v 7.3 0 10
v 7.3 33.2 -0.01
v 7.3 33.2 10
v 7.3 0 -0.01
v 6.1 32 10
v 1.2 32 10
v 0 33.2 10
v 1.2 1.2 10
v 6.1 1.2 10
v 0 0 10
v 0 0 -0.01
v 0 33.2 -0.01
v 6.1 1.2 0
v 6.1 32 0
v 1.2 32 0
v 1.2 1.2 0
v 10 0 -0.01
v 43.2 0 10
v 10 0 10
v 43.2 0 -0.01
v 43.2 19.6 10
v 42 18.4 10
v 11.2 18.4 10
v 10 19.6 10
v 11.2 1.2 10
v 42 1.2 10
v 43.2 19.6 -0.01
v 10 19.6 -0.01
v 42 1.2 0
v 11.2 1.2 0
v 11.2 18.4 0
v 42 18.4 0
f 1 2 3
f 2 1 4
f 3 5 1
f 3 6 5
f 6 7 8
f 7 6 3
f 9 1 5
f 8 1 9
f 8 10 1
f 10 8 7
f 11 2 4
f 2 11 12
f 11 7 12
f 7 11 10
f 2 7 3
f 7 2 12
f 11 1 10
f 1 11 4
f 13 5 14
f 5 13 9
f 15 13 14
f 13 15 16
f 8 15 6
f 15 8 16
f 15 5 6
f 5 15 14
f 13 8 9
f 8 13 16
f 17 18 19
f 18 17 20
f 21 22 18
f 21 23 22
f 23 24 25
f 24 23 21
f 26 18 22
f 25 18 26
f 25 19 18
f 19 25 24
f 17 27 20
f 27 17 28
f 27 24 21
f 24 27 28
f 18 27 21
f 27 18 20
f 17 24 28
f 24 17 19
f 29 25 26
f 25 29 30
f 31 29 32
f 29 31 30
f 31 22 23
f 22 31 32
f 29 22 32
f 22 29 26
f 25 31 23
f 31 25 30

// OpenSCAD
// file: ../../Base/Boxes.scad
// Fischertechnik Box Foundation
// Pre-designed Boxes

use <Constants.scad>

include <PlacementOptions.scad>

box190Width = 190;
box190Depth = 130;
box130Width = 130;
box130Depth = 95;
boxUsageHeight = 33.9;
boxWallThickness = 2.4;
boxBaseThickness = 1.0;

// getBoxWallThickness()
// Gets the wall thickness of a Fischertechnik Box

function getBoxWallThickness() = boxWallThickness;

// Gets the usable height of a fischertechnik box
function getBoxUsageHeight() = boxUsageHeight;

// Gets the thickness of the Fischertechnik box base.
function getBoxBaseThickness() = boxBaseThickness;

// Gets the usable inner space of a Box 190 as an x/y-list
function getBox190Space() = [
    box190Width - 2*getBoxWallThickness(), 
    box190Depth - 2*getBoxWallThickness() ];

// Imports the Fischertechnik empty box 130x190 mm and places it at position 0,0
// 190x130 are the outer sizes, the inner space is slightly smaller. Use getBox190Space() to get the inner sizes.
// This module needs the STL file "Fischertechnik Box 130x190.stl" in the library path.
// The box is positioned that the usable inner space is at the 0,0,0 position. The

module Box190() {
    translate([-getBoxWallThickness(),-getBoxWallThickness(),-getBoxBaseThickness()])
        import("Fischertechnik Box 130x190.stl", convexity=3);
}

// Gets the usable inner space of a Box 130 as an x/y-list
function getBox130Space() = [
    box130Width - 2*getBoxWallThickness(), 
    box130Depth - 2*getBoxWallThickness() ];

// Imports the Fischertechnik empty box 95x130 mm and places it at position 0,0
// 190x130 are the outer sizes, the inner space is slightly smaller. Use getBox190Space() to get the inner sizes.
// This module needs the STL file "Fischertechnik Box 95x130.stl" in the library path.
// The box is positioned that the usable inner space is at the 0,0,0 position. The

module Box130() {
    translate([-getBoxWallThickness(),-getBoxWallThickness(),-getBoxBaseThickness()])
        import("Fischertechnik Box 95x130.stl", convexity=3);
}

// Creates a web at the specified box walls
// corner 0 = LowerLeft, 1 = UpperLeft, 2 = UpperRight, 3 = LowerRight
// side 0 = LeftOfCorner, 1 = RightOfCorner
// distance = Distance in mm from the corner
// box = inner width and depth of the box (default: Box 190)
// webWidth = length of the web (default is 3 mms)
// webThickness = thickness of the web (default is 1 mm)

module BoxWeb(corner, side, distance, box=getBox190Space(), webWidth=3, webThickness=1.0) {
    sink = getBoxWallThickness()/2;

    width = (corner % 2 == 0) ? 
            (side == LeftOfCorner ? webWidth : webThickness) :
            (side == LeftOfCorner ? webThickness : webWidth);

    depth = (corner % 2 == 0) ? 
            (side == RightOfCorner ? webWidth : webThickness) :
            (side == RightOfCorner ? webThickness : webWidth);
    
    xDiff = corner == LowerLeft ? 
                (side == LeftOfCorner ? -sink : distance) :
            (corner == UpperLeft ?                
                (side == LeftOfCorner ? distance : -sink) :
            (corner == UpperRight ?
                (side == LeftOfCorner ? box.x-webWidth+sink : box.x-distance-webThickness) :
                (side == LeftOfCorner ? box.x-distance-webThickness: box.x-webWidth+sink)));

    yDiff = corner == LowerLeft ? 
                (side == RightOfCorner ? -sink : distance) :
            (corner == UpperLeft ?
                (side == RightOfCorner ? box.y-distance : box.y-webWidth+sink) :
            (corner == UpperRight ?
                (side == RightOfCorner ? box.y-webWidth+sink : box.y-distance) :
                (side == RightOfCorner ? distance : -sink)));
    
    translate([xDiff, yDiff, -getExcess()])
        cube([width, depth, boxUsageHeight + 2*getExcess()]);
}
// file: ../../Base/Rotation.scad
// Fischertechnik Box Foundation
// Geometry Helpers Rotation

include <PlacementOptions.scad>

// getRotatedSpace(space, rotation=NoRotation)
// Rotates the space dependent on the specified rotation

function getRotatedSpace(space, rotation=NoRotation) = [
    (rotation == Rotate90 || rotation == Rotate270) ? space.y : space.x,
    (rotation == Rotate90 || rotation == Rotate270) ? space.x : space.y
];

// Rotates the given space around the fixed left lower corner
// space = the space the children needs as width/depth list [width,depth]
// rotation = 0 Rotate0 degrees, 1 Rotate90 degrees, 2 Rotate180 degrees, 3 Rotate270 degrees (equivalent to -90)

module RotateFix(space, rotation=Rotate0) {
    dy = (rotation == Rotate0 || rotation == Rotate270) ? 0 :
        (rotation == Rotate90) ? space.x :
        space.y;
    dx = (rotation < Rotate180) ? 0 :
        (rotation == Rotate180) ? space.x :
        space.y;
    
    translate([dx, dy, 0])
        rotate([0, 0, rotations[rotation]])
            children();
}
// file: ../../Base/Alignment.scad
// Fischertechnik Box Foundation
// Geometry Helpers Alignment

include <PlacementOptions.scad>

// getAlignedX(elementWidth, spaceWidth, align=AlignRight, offset=0)
// Gets the aligned X offset of an element with the given
// width in the given space.
// elementWidth = The width of the element to positon
// spaceWidth = The space where the element should be aligned
// align = 0 AlignLeft, 1 AlignCenter, 2 AlignRight
// offset = an optional offset from the aligned position. When
// aligned left or centered, then positive values are in X direction.
// When aligned right then positive values are in negative X direction.

function getAlignedX(elementWidth, spaceWidth, align=AlignRight, offset=0) =
    (align == AlignLeft) ?
        offset :
        ((align == AlignCenter) ?
        (spaceWidth - elementWidth)/2 + offset :
        spaceWidth - offset - elementWidth);

// getAlignedY(elementDepth, spaceDepth, align=AlignTop, offset=0)
// Gets the aligned Y offset of an element with the given
// depth in the given space.
// elementDepth = The depth of the element to positon
// spaceDepth = The space where the element should be aligned
// align = 0 AlignBottom, 1 AlignCenter, 2 AlignTop
// offset = an optional offset from the aligned position. When
// aligned bottom or centered, then positive values are in Y direction.
// When aligned top then positive values are in negative Y direction.

function getAlignedY(elementDepth, spaceDepth, align=AlignTop, offset=0) =
    (align == AlignBottom) ?
        offset :
        ((align == AlignCenter) ?
        (spaceDepth - elementDepth)/2 + offset :
        spaceDepth - offset - elementDepth);
// file: ../../Base/Constants.scad
// Fischertechnik Box Foundation
// Constants

// Constant values necessary for multiple elements

// Base constants
dividerThickness = 1.2;
excess = 0.01;
fragments = 90;
tolerance = 0.8;

// Gets the thickness of a divider 
function getDividerThickness() = dividerThickness;

// Gets the excess that is used to merge walls into each other
function getExcess() = excess;

// Gets amount of fragments of a cylinder
function getFragments() = fragments;

// Gets the inner tolerance of a frame to each side
function getTolerance() = tolerance;


// Fischertechnik specific constants
axisDiameter = 4;
axisBottomDiameter = axisDiameter + 1;
standardEdgeDistance = 2.5;
standardWebDistance = 11.5;
standardCornerLength = 15;
tubeWallFactor = 1.6;

// Gets axis diameter
function getAxisDiameter() = axisDiameter;

// Gets axis bottom diameter for thicker part at the bottom
function getAxisBottomDiameter() = axisBottomDiameter;

// gets the standard distance to the wall of the box for dockable frames with webs
function getStandardEdgeDistance() = standardEdgeDistance;

// gets the standard distance of each web to the corner of the dockable frame
function getStandardWebDistance() = standardWebDistance;

// gets the standard length of the corner walls of a dockable frame
function getStandardCornerLength() = standardCornerLength;

// gets the wall thickness of a tube.
function getTubeWallThickness() = tubeWallFactor * getDividerThickness();
// file: ../../Base/PlacementOptions.scad
// Fischertechnik Box Foundation
// Placement Options

// Alignment
NoAlign = 0;
AlignLeft = 1;
AlignBottom = 2;
AlignCenter = 3;
AlignRight = 4;
AlignTop = 5;

// Element rotation degree steps
rotations = [0, -90, -180, -270];

// Rotation
NoRotation = 0;
Rotate0 = 0;
Rotate90 = 1;
Rotate180 = 2;
Rotate270 = 3;

// Docking (seen from above)
NoDock = -1;
DockLeft = 0;
DockTop = 1;
DockRight = 2;
DockCorner = 2;
DockBottom = 3;

// Web corners
LowerLeft = 0;
UpperLeft = 1;
UpperRight = 2;
LowerRight = 3;

// Web position relative to corner
LeftOfCorner = 0;
RightOfCorner = 1;
// file: ../../Elements/FrameFlatPiece30.scad
// Fischertechnik Box Library
// Frame for Flat Pieces 30
// 31013

use <../Base/Constants.scad>
use <../ModelBase/Complex.scad>

size = 30;

// getFrameFlatPiece30Space(count)
// count = count of pieces in X direction
// Gets the space for a frame for flat pieces 30.

function getFrameFlatPiece30Space(count=1) = getFrameFlatPieceVolume(count, size);

// FrameFlatPiece30(count)
// count = Count of flat pieces 30 in X direction

module FrameFlatPiece30(count=1) {  
    FrameFlatPiece(count, size);
}

// Tests
color("lightgray") {
FrameFlatPiece30(2);
}
// file: ../../Base/Placement.scad
// Fischertechnik Box Foundation
// Geometry Helpers Placement

use <Constants.scad>
use <Alignment.scad>
use <Rotation.scad>
use <Boxes.scad>

include <PlacementOptions.scad>

// Place(x=0, y=0, elementSpace=[0,0], alignX=AlignLeft, alignY=AlignBottom, rotation=Rotate0, boxSpace=getBox190Space())
// Places the child at the specified position
// y = Y-Position. This is a relative position when an X aligment is specified.
// x = X-Position. This is a relative position when an Y aligment is specified.
// elementSpace = space of the element to be placed [x,y]
// alignX = -1=NoAlign, 0 AlignLeft, 1 AlignCenter, 3 AlignRight (elementSpace and boxSpace required!)
// alignY = -1=NoAlign, 2 AlignBottom, 1 AlignCenter, 4 AlignTop (elementSpace and boxSpace required!)
// rotation = 0 Rotate0 0 degrees, 1 Rotate90 90 degrees, 
// 2 Rotate180 180 degrees, 3 Rotate270 270 degrees (equivalent to -90)
// boxSpace = Inner space of the box where the placement occurs [x,y] - default is Box 190x130 inner space

module Place(x=0, y=0, elementSpace=[0,0], 
  alignX=AlignLeft, alignY=AlignBottom, 
  rotation=NoRotation, boxSpace=getBox190Space()) {

    module Position(x, y, space, rotation=Rotate0) {
        translate([x, y, 0])
            RotateFix(space, rotation)
                children(0);
    }

    space = getRotatedSpace(elementSpace, rotation);
    alignedX = getAlignedX(space.x, boxSpace.x, alignX, x);
    alignedY = getAlignedY(space.y, boxSpace.y, alignY, y);
    Position(alignedX, alignedY, elementSpace, rotation)
        children(0);
}

// Center(space=getBox130Space(), elementSpace=[0,0])
// space = Space where the children is centered. For cylinder use centered=true and no elementSpace.
// elementSpace = space of the element to be centered [x,y]

module Center(space=getBox190Space(), elementSpace=[0,0]) {
    translate([(space.x - elementSpace.x) / 2, (space.y - elementSpace.y) / 2])
        children(0);
}

// CenterHorizontal(width=0, y=0, offset=0, space=getBox130Space())
// space = Space where the children is centered. For cylinder use centered=true and no elementSpace.
// elementSpace = space of the element to be centered [x,y]

module CenterHorizontal(width=0, y=0, offset=0, space=getBox190Space()) {
    translate([(space.x - width) / 2 + offset, y])
        children(0);
}

// CenterVertical(depth=0, x=0, offset=0, space=getBox130Space())
// space = Space where the children is centered. For cylinder use centered=true and no elementSpace.
// elementSpace = space of the element to be centered [x,y]

module CenterVerticalal(depth=0, x=0, offset=0, space=getBox190Space()) {
    translate([x, (space.y - depth) / 2 + offset])
        children(0);
}
// main file
// Fischertechnik Box Foundation
// Elements
// Test FrameFlatPiece30

use <../../Base/Placement.scad>
use <../../Elements/FrameFlatPiece30.scad>

include <../../Base/PlacementOptions.scad>

FrameFlatPiece30();

Place(10, 0, elementSpace=getFrameFlatPiece30Space(4), rotation=Rotate90)
    FrameFlatPiece30(4);
